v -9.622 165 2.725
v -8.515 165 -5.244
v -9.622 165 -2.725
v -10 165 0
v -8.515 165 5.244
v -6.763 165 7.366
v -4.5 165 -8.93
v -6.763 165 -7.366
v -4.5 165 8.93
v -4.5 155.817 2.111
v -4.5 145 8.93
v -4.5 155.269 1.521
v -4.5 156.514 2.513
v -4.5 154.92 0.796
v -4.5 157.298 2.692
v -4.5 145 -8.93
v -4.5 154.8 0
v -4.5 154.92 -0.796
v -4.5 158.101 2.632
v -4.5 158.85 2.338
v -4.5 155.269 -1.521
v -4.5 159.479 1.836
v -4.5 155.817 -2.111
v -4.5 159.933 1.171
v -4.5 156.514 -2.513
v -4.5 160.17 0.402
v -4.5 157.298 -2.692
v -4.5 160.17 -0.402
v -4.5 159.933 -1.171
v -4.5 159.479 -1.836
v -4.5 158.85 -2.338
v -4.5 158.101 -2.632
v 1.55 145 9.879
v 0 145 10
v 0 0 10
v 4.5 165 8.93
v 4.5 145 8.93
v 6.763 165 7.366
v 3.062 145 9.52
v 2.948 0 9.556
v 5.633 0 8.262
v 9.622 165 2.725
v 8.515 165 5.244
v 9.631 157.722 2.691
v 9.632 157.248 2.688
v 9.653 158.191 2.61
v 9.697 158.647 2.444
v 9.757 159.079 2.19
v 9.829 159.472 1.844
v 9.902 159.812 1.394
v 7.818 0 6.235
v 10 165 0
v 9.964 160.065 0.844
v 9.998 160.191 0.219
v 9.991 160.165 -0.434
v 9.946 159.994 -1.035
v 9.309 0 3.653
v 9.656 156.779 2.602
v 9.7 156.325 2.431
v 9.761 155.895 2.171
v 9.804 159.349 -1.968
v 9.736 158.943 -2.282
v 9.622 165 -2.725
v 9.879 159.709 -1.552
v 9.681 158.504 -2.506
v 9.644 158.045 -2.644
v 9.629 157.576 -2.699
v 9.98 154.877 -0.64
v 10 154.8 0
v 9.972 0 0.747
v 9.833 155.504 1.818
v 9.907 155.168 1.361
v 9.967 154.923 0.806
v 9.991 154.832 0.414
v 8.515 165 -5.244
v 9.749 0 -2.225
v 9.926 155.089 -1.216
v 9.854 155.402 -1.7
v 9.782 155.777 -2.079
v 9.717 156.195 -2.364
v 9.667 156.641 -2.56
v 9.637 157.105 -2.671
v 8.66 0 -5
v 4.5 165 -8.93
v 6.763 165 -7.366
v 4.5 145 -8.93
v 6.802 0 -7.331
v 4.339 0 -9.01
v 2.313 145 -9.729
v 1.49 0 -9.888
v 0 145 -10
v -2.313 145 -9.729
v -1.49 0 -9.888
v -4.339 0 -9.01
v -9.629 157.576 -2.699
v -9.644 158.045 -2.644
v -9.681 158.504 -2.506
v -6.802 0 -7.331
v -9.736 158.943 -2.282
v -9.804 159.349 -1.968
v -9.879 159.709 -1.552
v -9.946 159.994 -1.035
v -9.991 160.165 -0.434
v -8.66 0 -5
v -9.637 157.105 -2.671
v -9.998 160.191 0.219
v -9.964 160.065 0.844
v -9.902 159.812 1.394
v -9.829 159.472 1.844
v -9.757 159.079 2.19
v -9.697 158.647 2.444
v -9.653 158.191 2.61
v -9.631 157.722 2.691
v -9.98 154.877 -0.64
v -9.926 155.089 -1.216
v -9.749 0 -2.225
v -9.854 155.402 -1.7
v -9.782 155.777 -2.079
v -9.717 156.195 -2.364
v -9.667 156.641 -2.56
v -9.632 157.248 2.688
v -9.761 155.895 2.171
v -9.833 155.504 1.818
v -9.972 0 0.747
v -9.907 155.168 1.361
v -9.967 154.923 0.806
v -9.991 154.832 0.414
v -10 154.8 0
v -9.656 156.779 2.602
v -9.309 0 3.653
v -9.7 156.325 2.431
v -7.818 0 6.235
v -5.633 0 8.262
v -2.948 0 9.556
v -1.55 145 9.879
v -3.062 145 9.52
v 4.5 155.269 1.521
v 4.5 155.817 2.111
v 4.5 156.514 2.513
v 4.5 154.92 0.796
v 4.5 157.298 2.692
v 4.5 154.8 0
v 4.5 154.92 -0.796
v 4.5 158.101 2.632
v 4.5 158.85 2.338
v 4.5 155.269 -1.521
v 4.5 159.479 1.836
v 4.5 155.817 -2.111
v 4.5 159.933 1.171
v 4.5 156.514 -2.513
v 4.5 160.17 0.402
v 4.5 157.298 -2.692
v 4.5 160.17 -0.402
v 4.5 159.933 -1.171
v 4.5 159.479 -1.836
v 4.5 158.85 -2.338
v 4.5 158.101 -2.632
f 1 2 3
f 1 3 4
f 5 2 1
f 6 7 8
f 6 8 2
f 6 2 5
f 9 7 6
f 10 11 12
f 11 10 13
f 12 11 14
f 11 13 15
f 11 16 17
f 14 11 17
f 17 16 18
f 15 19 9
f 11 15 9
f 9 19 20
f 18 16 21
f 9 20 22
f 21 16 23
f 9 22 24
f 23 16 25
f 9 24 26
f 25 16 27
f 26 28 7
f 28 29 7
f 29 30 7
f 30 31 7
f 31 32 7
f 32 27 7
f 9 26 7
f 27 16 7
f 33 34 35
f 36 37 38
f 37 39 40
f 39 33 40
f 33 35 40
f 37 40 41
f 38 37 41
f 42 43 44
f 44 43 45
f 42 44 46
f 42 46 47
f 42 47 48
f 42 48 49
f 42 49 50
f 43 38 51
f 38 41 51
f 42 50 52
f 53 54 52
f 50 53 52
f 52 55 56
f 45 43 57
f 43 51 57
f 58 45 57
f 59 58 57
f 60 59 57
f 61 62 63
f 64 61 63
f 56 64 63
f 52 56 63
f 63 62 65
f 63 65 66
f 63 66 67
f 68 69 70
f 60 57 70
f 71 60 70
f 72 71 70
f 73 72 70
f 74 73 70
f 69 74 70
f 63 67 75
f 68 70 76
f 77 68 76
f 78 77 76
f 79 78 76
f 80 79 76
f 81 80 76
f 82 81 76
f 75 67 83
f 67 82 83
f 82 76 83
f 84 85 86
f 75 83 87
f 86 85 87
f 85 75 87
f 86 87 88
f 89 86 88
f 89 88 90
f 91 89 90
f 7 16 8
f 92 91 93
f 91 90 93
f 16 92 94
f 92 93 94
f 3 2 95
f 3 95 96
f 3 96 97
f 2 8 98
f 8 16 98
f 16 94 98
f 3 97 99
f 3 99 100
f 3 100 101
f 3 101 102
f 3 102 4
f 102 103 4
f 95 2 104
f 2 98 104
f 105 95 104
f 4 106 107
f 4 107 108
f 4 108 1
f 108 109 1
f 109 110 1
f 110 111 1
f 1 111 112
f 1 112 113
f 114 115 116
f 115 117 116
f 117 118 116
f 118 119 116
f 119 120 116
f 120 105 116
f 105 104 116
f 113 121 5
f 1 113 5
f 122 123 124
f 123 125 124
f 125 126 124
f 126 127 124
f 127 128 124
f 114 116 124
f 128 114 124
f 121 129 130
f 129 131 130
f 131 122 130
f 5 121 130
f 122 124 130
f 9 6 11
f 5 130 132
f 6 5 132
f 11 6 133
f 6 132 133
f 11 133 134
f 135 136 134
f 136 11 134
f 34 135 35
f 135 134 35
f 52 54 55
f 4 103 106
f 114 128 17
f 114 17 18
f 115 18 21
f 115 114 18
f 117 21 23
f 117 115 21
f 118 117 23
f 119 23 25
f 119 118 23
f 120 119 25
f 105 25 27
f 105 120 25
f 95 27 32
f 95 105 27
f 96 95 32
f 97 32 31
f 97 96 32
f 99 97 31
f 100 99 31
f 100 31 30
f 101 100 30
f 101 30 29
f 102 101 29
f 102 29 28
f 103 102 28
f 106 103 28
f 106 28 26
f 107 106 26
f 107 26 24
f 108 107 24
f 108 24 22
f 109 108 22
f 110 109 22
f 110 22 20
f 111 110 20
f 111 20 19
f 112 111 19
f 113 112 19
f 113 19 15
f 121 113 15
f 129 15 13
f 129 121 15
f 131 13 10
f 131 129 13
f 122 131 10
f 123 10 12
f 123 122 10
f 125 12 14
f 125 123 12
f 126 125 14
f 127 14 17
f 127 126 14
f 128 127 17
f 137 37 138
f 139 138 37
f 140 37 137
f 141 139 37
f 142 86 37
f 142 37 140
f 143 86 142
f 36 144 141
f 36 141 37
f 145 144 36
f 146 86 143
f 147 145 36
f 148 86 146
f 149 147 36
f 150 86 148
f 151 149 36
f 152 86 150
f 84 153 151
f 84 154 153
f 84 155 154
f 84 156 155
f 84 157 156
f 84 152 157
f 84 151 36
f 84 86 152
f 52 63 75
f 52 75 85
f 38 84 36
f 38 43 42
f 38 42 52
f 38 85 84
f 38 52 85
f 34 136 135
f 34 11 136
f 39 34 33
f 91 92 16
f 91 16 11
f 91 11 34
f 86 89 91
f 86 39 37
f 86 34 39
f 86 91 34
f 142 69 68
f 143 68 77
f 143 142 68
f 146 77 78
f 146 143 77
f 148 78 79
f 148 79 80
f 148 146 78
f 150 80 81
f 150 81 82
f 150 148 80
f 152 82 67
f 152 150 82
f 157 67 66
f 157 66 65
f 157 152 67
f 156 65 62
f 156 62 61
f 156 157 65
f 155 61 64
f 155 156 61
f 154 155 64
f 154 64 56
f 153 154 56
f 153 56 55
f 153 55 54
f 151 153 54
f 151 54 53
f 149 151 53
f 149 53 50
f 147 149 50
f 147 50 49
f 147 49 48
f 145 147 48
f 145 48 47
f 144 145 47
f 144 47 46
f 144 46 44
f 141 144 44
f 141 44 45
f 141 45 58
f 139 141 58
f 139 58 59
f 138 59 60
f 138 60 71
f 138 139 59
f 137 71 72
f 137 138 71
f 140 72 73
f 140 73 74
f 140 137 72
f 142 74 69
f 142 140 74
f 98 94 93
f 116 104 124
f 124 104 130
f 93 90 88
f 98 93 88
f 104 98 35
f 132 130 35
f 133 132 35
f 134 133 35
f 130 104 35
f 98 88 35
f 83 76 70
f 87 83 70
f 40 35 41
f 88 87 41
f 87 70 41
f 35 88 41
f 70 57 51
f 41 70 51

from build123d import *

# Parameters (mm, degrees)
SKETCH1_R               = 10
BOSS_EXTRUDE1_DEPTH     = 165
CUT_EXTRUDE1_DEPTH      = 166.604951617
CUT_EXTRUDE1_DEPTH_BACK = 166.604951617
SKETCH2_W               = 9
SKETCH2_H               = 40
CUT_EXTRUDE2_DEPTH      = 166.604951617
CUT_EXTRUDE2_DEPTH_BACK = 166.604951617
SKETCH3_R               = 2.7


with BuildPart() as part:
    # Sketch1 → Boss-Extrude1 (new body)
    with BuildSketch(Plane(origin=(0, 0, 0), x_dir=(1, 0, 0), z_dir=(0, 1, 0))):
        with Locations(Location((0, 0, 0), (0, 0, 270))):
            Circle(SKETCH1_R)
    extrude(amount=BOSS_EXTRUDE1_DEPTH)

    # Sketch2 → Cut-Extrude1 (cut, two sides: drawn at the far end of the back side and taken through both)
    with BuildSketch(Plane.XY.offset(-CUT_EXTRUDE1_DEPTH_BACK)):
        with Locations((0, 165)):
            Rectangle(SKETCH2_W, SKETCH2_H)
    extrude(amount=CUT_EXTRUDE1_DEPTH + CUT_EXTRUDE1_DEPTH_BACK, mode=Mode.SUBTRACT)

    # Sketch3 → Cut-Extrude2 (cut, two sides: drawn at the far end of the back side and taken through both)
    with BuildSketch(Plane(origin=(0, 0, 0), x_dir=(0, 0, -1), z_dir=(1, 0, 0)).offset(-CUT_EXTRUDE2_DEPTH_BACK)):
        with Locations(Location((0, 157.5, 0), (0, 0, 270))):
            Circle(SKETCH3_R)
    extrude(amount=CUT_EXTRUDE2_DEPTH + CUT_EXTRUDE2_DEPTH_BACK, mode=Mode.SUBTRACT)


solid = part.part
